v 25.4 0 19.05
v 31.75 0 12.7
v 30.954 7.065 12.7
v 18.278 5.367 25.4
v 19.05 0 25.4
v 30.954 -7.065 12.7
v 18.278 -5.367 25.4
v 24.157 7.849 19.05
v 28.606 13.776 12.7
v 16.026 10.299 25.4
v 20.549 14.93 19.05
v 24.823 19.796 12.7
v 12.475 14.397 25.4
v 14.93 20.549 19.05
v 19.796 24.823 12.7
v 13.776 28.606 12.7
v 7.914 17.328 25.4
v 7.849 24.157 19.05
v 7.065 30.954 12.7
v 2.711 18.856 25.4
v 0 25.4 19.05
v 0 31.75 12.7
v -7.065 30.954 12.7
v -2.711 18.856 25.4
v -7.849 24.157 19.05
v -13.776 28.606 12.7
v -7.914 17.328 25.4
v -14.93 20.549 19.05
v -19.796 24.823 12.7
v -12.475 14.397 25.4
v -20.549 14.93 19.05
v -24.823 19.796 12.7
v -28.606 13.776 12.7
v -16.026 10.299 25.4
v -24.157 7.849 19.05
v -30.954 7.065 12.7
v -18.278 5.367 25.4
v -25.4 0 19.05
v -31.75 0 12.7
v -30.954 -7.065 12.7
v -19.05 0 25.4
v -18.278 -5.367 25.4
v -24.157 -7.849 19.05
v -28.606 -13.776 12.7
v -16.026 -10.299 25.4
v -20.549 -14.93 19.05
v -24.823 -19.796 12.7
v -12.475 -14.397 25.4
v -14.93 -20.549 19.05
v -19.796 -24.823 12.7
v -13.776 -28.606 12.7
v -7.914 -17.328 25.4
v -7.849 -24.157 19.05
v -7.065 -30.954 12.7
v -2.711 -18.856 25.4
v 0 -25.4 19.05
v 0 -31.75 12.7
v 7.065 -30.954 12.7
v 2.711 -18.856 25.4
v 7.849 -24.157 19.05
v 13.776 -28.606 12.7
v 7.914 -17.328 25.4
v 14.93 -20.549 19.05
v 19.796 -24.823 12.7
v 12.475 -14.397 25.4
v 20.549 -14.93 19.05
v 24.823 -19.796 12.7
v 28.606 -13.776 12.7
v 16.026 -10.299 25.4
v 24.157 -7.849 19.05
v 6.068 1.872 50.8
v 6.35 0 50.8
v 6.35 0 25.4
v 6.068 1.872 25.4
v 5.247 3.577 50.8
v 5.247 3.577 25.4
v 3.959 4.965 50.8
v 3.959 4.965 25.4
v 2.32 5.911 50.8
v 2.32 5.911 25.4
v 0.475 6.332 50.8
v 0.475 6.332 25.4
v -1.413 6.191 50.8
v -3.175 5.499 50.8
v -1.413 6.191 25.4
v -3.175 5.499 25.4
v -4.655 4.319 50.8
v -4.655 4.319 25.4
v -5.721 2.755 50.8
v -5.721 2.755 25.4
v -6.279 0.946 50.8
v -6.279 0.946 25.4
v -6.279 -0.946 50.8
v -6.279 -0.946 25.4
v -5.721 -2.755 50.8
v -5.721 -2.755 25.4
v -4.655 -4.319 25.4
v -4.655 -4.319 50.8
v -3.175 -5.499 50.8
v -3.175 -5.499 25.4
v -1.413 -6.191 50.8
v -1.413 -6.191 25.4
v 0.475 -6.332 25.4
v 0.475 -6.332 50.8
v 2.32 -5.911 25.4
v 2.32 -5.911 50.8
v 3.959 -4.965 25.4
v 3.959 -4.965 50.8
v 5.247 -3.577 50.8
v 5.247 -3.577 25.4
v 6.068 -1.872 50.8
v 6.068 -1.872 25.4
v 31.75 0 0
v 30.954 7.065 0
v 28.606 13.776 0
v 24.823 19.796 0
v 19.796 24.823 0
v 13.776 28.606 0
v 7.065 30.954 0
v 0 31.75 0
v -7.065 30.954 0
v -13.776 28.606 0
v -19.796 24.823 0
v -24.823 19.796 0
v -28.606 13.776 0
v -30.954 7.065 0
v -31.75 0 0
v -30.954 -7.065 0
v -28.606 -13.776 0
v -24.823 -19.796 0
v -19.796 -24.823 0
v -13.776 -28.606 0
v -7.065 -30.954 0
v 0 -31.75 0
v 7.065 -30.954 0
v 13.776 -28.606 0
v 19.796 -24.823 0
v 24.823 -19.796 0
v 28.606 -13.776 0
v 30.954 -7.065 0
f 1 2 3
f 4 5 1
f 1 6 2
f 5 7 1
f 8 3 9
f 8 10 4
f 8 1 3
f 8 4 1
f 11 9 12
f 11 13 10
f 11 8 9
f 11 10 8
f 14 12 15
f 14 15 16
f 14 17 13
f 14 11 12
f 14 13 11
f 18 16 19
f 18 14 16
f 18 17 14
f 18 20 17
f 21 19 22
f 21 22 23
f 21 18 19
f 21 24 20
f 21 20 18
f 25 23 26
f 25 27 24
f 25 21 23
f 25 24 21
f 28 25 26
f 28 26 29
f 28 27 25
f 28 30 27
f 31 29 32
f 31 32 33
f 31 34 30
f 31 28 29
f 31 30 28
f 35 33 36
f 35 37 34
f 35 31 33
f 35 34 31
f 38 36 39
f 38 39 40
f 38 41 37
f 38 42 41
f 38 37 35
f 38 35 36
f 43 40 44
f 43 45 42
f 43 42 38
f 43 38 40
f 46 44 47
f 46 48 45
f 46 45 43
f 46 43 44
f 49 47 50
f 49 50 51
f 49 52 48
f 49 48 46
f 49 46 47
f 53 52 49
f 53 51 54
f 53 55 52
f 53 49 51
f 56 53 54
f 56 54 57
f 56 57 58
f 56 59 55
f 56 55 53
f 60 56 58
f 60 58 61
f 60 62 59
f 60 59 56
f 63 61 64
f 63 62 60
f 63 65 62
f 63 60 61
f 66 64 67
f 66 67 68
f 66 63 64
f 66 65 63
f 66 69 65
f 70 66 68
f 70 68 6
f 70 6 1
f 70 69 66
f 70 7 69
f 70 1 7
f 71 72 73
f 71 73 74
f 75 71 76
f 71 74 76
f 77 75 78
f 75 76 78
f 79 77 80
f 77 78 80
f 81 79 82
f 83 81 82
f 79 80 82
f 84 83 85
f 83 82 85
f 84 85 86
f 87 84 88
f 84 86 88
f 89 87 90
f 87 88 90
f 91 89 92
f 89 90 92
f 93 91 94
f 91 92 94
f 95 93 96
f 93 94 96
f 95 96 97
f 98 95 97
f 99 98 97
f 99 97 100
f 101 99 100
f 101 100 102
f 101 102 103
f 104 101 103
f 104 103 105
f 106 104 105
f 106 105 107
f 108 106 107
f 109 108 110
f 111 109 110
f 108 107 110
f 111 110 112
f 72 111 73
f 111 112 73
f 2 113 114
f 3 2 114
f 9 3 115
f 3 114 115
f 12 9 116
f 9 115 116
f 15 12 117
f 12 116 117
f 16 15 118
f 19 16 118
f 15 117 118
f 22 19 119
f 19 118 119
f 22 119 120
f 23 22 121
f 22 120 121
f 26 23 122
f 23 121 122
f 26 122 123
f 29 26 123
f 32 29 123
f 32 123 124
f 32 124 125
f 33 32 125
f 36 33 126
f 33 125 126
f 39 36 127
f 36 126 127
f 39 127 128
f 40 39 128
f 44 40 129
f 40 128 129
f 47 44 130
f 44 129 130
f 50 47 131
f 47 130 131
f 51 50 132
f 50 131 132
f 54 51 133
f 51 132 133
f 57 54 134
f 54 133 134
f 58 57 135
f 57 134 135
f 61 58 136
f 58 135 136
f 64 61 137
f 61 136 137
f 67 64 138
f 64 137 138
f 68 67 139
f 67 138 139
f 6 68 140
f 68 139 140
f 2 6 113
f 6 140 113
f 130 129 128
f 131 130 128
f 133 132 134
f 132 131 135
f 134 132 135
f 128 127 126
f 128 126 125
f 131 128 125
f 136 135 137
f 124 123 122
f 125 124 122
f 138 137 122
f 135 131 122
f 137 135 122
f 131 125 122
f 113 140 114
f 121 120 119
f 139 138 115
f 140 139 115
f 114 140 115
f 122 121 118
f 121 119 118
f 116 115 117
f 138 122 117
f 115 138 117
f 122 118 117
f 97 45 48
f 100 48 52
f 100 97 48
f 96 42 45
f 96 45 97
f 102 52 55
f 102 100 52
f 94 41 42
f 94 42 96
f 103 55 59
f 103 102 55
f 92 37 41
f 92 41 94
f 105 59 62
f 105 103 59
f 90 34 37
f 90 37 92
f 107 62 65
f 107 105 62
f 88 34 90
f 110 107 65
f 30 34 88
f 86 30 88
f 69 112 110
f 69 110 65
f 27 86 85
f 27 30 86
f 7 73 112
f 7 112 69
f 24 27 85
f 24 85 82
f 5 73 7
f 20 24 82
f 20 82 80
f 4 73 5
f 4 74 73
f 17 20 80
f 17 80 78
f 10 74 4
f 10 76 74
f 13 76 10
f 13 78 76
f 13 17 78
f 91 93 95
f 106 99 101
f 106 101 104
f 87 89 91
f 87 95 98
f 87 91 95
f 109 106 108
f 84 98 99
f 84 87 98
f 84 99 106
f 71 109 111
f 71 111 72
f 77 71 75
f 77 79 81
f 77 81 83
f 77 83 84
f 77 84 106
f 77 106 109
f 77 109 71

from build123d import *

# Parameters (mm, degrees)
F0_R     = 31.75
F1_DEPTH = 25.4
F2_SIZE  = 12.7
F3_R     = 6.35
F4_DEPTH = 25.4


with BuildPart() as f1:
    # F0 (on Top) → F1 (new body)
    with BuildSketch(Plane.XY):
        Circle(F0_R)
    extrude(amount=F1_DEPTH)

    # F2
    f2_edges = [f1.edges().sort_by_distance(p)[0] for p in [
        (-31.75, 0, 25.4),
    ]]
    chamfer(f2_edges, length=F2_SIZE)

    # F3 (on face) → F4 (join)
    with BuildSketch(Plane.XY.offset(25.4)):
        Circle(F3_R)
    extrude(amount=F4_DEPTH)


solid = f1.part
